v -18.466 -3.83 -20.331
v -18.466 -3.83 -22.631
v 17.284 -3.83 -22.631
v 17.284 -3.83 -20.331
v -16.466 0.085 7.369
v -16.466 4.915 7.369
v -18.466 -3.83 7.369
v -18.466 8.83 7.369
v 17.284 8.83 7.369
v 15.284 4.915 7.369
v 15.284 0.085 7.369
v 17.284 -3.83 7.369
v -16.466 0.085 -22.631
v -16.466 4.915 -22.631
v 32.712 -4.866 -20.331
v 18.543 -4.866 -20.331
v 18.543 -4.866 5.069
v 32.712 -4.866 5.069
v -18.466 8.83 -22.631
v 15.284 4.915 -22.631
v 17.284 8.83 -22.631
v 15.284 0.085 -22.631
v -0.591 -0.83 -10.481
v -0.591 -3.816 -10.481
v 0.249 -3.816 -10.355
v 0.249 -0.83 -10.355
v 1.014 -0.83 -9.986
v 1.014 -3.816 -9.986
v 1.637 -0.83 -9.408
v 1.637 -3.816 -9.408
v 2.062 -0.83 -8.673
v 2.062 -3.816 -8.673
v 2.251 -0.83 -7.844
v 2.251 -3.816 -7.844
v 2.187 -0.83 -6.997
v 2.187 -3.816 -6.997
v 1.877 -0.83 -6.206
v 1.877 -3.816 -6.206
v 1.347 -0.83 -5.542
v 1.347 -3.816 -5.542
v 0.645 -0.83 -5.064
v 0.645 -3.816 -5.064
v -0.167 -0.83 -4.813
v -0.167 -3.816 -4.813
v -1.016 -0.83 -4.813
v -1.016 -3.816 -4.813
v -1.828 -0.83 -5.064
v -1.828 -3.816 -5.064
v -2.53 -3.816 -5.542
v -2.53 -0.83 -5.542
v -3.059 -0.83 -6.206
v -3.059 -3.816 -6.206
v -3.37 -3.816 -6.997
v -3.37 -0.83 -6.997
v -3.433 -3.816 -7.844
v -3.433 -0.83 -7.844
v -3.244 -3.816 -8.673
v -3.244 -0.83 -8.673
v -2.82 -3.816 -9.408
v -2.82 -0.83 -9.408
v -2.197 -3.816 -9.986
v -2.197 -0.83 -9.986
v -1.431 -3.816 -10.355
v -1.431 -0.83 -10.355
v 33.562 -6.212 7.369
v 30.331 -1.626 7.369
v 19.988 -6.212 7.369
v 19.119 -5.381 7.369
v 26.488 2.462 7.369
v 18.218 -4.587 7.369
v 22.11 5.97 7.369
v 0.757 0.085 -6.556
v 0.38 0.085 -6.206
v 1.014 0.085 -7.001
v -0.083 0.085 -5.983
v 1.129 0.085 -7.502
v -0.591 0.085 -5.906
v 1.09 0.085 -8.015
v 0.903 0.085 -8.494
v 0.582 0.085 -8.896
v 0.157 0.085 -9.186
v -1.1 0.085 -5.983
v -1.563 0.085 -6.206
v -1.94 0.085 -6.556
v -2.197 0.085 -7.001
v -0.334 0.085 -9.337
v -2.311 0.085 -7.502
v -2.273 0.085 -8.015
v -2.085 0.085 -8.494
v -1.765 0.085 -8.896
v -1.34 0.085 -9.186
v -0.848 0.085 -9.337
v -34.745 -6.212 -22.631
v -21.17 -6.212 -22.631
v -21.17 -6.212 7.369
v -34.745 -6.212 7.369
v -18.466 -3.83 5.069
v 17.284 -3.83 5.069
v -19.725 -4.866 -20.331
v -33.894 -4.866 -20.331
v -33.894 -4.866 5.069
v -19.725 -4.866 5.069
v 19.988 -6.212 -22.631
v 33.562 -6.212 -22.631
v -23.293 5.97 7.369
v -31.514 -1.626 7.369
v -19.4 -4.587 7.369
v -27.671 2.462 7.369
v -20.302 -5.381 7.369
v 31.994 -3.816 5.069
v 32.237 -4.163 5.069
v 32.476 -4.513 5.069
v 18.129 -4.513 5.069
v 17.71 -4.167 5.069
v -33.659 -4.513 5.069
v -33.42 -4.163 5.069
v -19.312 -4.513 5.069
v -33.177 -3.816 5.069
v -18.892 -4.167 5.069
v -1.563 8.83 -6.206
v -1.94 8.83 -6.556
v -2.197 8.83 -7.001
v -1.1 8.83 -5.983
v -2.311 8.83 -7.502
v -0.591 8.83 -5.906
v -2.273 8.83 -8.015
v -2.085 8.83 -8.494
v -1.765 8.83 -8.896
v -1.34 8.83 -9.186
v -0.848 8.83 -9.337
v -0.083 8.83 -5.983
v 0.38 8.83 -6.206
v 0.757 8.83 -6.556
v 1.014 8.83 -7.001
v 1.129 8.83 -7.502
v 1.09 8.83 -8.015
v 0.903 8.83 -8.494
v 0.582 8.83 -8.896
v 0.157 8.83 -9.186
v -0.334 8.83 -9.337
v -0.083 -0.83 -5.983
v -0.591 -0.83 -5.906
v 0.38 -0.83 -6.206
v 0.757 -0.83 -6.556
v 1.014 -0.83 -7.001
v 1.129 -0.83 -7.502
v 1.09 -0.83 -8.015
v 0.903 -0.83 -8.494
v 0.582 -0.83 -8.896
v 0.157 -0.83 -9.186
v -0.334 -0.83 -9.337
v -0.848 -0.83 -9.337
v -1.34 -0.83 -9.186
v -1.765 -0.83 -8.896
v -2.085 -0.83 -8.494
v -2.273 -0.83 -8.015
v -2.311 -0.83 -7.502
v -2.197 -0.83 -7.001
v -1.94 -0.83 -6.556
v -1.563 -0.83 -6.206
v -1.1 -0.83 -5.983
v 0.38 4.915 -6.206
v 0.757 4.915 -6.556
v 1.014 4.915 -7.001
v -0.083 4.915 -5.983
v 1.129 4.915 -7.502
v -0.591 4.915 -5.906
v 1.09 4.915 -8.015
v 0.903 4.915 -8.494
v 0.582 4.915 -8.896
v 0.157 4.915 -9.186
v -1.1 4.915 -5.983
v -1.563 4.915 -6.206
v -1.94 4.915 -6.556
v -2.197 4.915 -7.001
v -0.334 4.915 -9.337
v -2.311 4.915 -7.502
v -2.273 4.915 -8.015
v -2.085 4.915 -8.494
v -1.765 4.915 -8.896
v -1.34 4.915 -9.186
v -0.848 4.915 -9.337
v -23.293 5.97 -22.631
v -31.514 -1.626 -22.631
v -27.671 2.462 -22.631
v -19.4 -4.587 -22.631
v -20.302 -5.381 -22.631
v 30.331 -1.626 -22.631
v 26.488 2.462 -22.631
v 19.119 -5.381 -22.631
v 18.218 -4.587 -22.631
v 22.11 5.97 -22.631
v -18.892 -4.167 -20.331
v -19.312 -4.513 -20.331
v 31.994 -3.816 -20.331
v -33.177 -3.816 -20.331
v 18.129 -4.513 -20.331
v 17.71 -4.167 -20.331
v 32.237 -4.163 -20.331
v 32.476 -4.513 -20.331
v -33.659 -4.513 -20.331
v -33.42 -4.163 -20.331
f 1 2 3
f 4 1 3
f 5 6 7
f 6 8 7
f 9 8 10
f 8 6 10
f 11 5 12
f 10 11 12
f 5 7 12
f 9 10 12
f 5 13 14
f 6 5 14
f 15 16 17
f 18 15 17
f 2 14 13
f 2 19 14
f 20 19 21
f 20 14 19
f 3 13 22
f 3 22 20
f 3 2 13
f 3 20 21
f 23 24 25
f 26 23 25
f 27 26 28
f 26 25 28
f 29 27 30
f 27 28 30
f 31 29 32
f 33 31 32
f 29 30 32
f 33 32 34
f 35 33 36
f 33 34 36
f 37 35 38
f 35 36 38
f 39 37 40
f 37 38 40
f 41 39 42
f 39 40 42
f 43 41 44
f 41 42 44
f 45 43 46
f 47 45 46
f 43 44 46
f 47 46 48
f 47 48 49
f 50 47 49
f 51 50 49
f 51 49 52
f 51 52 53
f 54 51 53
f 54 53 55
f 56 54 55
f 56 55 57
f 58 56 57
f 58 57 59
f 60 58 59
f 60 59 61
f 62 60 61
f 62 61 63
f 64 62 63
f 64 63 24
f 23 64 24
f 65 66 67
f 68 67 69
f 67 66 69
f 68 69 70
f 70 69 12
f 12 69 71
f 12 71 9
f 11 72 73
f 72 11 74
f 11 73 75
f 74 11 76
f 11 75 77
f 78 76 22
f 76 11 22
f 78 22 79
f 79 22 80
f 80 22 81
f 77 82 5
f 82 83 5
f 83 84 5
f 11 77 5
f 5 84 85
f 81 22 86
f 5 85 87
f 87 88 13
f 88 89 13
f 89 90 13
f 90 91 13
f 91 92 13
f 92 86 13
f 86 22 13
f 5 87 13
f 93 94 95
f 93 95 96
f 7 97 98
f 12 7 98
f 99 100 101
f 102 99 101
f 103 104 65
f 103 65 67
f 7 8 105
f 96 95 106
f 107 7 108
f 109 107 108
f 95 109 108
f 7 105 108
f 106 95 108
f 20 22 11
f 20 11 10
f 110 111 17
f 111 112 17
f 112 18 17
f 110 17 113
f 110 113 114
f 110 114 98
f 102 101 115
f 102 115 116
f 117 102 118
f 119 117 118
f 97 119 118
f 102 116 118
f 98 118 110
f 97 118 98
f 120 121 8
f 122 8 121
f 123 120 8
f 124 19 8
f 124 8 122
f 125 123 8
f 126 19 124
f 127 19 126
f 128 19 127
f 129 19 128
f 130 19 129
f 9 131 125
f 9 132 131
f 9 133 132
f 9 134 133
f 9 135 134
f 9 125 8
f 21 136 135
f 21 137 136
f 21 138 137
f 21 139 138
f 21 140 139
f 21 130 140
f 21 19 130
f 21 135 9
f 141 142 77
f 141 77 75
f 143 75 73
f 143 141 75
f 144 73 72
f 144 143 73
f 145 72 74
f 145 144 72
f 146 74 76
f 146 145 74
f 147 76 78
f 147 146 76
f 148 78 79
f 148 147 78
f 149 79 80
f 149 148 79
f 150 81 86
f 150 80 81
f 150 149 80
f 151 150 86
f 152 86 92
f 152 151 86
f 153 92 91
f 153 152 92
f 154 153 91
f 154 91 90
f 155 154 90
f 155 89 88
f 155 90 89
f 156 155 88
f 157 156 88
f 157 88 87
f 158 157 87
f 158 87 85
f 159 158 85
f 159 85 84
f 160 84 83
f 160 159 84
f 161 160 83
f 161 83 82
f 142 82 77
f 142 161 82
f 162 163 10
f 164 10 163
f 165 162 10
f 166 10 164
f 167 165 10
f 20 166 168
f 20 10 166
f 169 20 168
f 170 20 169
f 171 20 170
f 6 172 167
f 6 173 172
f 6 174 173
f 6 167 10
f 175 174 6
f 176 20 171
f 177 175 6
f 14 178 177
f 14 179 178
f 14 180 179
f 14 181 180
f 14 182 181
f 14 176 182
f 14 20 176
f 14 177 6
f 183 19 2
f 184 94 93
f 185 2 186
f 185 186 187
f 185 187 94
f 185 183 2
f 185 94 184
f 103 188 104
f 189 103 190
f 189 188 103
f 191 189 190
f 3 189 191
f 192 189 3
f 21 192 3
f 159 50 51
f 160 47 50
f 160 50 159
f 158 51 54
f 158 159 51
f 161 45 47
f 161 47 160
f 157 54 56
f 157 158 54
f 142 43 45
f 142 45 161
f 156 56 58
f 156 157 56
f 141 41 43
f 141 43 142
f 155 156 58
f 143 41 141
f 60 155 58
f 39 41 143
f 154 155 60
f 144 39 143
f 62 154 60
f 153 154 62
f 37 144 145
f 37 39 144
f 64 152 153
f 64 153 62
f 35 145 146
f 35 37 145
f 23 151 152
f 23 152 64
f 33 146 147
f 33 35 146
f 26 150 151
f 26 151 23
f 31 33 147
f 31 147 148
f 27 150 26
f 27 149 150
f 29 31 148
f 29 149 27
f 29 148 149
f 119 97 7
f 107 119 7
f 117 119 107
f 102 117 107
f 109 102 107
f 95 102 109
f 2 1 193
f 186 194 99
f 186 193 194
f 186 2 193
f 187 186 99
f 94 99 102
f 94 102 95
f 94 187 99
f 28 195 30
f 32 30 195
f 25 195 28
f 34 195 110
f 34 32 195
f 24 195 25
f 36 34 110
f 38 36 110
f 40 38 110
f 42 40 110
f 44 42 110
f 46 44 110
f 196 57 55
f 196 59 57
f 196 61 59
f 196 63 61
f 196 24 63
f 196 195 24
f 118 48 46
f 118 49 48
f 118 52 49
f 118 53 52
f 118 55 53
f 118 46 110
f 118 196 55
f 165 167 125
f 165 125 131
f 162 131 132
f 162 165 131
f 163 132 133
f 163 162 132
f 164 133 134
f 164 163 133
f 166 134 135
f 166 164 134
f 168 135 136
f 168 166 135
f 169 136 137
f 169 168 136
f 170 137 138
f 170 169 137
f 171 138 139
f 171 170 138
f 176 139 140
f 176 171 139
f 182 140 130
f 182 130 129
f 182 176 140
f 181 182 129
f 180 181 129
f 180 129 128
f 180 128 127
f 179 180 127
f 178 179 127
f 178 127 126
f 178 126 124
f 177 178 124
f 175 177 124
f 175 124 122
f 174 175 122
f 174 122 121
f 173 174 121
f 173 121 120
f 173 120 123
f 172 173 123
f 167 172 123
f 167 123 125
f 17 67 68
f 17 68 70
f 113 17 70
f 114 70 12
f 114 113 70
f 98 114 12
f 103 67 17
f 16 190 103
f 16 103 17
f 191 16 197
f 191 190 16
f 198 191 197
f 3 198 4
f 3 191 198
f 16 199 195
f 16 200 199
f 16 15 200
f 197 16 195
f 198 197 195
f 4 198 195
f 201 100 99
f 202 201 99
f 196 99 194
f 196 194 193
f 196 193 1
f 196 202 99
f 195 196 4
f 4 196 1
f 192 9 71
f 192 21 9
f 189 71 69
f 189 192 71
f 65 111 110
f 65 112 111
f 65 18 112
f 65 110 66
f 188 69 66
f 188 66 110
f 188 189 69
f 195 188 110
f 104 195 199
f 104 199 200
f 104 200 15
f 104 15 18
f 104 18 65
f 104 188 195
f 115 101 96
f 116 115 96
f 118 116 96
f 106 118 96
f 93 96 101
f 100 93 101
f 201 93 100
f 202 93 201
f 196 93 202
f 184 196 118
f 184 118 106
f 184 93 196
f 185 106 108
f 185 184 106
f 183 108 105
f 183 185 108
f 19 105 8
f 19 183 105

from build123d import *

# Parameters (mm, degrees)
BOSS_EXTRUDE1_DEPTH      = 8.83
BOSS_EXTRUDE1_DEPTH_BACK = 3.83
SKETCH1_W                = 35.75
SKETCH1_H                = 30
SKETCH1_R                = 1.725
SKETCH2_W                = 31.75
SKETCH2_H                = 4.83
CUT_EXTRUDE1_DEPTH       = 37.317668183
BOSS_EXTRUDE4_DEPTH      = 7.368601
BOSS_EXTRUDE4_DEPTH_BACK = 22.631399
SKETCH7_W                = 25.4
SKETCH7_H                = 1.05
CUT_EXTRUDE2_DEPTH       = 73.49839785
SKETCH8_R                = 2.85
CUT_EXTRUDE3_DEPTH       = 3


with BuildPart() as part:
    # Sketch1 → Boss-Extrude1 (new, two sides: drawn at the far end of the back side and taken through both)
    with BuildSketch(Plane(origin=(0, 0, 0), x_dir=(1, 0, 0), z_dir=(0, 1, 0)).offset(-BOSS_EXTRUDE1_DEPTH_BACK)):
        with Locations((-0.591296928, 7.631399317)):
            Rectangle(SKETCH1_W, SKETCH1_H)
        with Locations(Location((-0.591296928, 7.631399317, 0), (0, 0, 270))):
            Circle(SKETCH1_R, mode=Mode.SUBTRACT)
    extrude(amount=BOSS_EXTRUDE1_DEPTH + BOSS_EXTRUDE1_DEPTH_BACK)

    # Sketch2 → Cut-Extrude1 (cut, through all)
    with BuildSketch(Plane(origin=(0, 0, -22.631399317), x_dir=(-1, 0, 0), z_dir=(0, 0, -1))):
        with Locations((0.591296928, 2.5)):
            Rectangle(SKETCH2_W, SKETCH2_H)
    extrude(amount=-CUT_EXTRUDE1_DEPTH, mode=Mode.SUBTRACT)

    # Sketch4 → Boss-Extrude4 (add, two sides: drawn at the far end of the back side and taken through both)
    with BuildSketch(Plane.XY.offset(-BOSS_EXTRUDE4_DEPTH_BACK)):
        with BuildLine():
            Line((33.562284713, -6.212446851), (19.98770661, -6.212446851))
            ThreePointArc((19.98770661, -6.212446851), (18.67257107, -4.979381394), (17.283703072, -3.83))
            Line((17.283703072, -3.83), (17.283703072, 8.83))
            ThreePointArc((17.283703072, 8.83), (26.488439568, 2.461776787), (33.562284713, -6.212446851))
        make_face()
        with BuildLine():
            Line((-21.170300466, -6.212446851), (-34.74487857, -6.212446851))
            ThreePointArc((-34.74487857, -6.212446851), (-27.671033425, 2.461776787), (-18.466296928, 8.83))
            Line((-18.466296928, 8.83), (-18.466296928, -3.83))
            ThreePointArc((-18.466296928, -3.83), (-19.855164927, -4.979381394), (-21.170300466, -6.212446851))
        make_face()
    extrude(amount=BOSS_EXTRUDE4_DEPTH + BOSS_EXTRUDE4_DEPTH_BACK)

    # Sketch7 → Cut-Extrude2 (cut, through all)
    with BuildSketch(Plane.ZY.offset(34.74487857)):
        with Locations((-7.631399317, -4.340632565)):
            Rectangle(SKETCH7_W, SKETCH7_H)
    extrude(amount=-CUT_EXTRUDE2_DEPTH, mode=Mode.SUBTRACT)

    # Sketch8 → Cut-Extrude3 (cut)
    with BuildSketch(Plane.XZ.offset(3.83)):
        with Locations(Location((-0.591296928, -7.631399317, 0), (0, 0, 270))):
            Circle(SKETCH8_R)
    extrude(amount=-CUT_EXTRUDE3_DEPTH, mode=Mode.SUBTRACT)


solid = part.part
